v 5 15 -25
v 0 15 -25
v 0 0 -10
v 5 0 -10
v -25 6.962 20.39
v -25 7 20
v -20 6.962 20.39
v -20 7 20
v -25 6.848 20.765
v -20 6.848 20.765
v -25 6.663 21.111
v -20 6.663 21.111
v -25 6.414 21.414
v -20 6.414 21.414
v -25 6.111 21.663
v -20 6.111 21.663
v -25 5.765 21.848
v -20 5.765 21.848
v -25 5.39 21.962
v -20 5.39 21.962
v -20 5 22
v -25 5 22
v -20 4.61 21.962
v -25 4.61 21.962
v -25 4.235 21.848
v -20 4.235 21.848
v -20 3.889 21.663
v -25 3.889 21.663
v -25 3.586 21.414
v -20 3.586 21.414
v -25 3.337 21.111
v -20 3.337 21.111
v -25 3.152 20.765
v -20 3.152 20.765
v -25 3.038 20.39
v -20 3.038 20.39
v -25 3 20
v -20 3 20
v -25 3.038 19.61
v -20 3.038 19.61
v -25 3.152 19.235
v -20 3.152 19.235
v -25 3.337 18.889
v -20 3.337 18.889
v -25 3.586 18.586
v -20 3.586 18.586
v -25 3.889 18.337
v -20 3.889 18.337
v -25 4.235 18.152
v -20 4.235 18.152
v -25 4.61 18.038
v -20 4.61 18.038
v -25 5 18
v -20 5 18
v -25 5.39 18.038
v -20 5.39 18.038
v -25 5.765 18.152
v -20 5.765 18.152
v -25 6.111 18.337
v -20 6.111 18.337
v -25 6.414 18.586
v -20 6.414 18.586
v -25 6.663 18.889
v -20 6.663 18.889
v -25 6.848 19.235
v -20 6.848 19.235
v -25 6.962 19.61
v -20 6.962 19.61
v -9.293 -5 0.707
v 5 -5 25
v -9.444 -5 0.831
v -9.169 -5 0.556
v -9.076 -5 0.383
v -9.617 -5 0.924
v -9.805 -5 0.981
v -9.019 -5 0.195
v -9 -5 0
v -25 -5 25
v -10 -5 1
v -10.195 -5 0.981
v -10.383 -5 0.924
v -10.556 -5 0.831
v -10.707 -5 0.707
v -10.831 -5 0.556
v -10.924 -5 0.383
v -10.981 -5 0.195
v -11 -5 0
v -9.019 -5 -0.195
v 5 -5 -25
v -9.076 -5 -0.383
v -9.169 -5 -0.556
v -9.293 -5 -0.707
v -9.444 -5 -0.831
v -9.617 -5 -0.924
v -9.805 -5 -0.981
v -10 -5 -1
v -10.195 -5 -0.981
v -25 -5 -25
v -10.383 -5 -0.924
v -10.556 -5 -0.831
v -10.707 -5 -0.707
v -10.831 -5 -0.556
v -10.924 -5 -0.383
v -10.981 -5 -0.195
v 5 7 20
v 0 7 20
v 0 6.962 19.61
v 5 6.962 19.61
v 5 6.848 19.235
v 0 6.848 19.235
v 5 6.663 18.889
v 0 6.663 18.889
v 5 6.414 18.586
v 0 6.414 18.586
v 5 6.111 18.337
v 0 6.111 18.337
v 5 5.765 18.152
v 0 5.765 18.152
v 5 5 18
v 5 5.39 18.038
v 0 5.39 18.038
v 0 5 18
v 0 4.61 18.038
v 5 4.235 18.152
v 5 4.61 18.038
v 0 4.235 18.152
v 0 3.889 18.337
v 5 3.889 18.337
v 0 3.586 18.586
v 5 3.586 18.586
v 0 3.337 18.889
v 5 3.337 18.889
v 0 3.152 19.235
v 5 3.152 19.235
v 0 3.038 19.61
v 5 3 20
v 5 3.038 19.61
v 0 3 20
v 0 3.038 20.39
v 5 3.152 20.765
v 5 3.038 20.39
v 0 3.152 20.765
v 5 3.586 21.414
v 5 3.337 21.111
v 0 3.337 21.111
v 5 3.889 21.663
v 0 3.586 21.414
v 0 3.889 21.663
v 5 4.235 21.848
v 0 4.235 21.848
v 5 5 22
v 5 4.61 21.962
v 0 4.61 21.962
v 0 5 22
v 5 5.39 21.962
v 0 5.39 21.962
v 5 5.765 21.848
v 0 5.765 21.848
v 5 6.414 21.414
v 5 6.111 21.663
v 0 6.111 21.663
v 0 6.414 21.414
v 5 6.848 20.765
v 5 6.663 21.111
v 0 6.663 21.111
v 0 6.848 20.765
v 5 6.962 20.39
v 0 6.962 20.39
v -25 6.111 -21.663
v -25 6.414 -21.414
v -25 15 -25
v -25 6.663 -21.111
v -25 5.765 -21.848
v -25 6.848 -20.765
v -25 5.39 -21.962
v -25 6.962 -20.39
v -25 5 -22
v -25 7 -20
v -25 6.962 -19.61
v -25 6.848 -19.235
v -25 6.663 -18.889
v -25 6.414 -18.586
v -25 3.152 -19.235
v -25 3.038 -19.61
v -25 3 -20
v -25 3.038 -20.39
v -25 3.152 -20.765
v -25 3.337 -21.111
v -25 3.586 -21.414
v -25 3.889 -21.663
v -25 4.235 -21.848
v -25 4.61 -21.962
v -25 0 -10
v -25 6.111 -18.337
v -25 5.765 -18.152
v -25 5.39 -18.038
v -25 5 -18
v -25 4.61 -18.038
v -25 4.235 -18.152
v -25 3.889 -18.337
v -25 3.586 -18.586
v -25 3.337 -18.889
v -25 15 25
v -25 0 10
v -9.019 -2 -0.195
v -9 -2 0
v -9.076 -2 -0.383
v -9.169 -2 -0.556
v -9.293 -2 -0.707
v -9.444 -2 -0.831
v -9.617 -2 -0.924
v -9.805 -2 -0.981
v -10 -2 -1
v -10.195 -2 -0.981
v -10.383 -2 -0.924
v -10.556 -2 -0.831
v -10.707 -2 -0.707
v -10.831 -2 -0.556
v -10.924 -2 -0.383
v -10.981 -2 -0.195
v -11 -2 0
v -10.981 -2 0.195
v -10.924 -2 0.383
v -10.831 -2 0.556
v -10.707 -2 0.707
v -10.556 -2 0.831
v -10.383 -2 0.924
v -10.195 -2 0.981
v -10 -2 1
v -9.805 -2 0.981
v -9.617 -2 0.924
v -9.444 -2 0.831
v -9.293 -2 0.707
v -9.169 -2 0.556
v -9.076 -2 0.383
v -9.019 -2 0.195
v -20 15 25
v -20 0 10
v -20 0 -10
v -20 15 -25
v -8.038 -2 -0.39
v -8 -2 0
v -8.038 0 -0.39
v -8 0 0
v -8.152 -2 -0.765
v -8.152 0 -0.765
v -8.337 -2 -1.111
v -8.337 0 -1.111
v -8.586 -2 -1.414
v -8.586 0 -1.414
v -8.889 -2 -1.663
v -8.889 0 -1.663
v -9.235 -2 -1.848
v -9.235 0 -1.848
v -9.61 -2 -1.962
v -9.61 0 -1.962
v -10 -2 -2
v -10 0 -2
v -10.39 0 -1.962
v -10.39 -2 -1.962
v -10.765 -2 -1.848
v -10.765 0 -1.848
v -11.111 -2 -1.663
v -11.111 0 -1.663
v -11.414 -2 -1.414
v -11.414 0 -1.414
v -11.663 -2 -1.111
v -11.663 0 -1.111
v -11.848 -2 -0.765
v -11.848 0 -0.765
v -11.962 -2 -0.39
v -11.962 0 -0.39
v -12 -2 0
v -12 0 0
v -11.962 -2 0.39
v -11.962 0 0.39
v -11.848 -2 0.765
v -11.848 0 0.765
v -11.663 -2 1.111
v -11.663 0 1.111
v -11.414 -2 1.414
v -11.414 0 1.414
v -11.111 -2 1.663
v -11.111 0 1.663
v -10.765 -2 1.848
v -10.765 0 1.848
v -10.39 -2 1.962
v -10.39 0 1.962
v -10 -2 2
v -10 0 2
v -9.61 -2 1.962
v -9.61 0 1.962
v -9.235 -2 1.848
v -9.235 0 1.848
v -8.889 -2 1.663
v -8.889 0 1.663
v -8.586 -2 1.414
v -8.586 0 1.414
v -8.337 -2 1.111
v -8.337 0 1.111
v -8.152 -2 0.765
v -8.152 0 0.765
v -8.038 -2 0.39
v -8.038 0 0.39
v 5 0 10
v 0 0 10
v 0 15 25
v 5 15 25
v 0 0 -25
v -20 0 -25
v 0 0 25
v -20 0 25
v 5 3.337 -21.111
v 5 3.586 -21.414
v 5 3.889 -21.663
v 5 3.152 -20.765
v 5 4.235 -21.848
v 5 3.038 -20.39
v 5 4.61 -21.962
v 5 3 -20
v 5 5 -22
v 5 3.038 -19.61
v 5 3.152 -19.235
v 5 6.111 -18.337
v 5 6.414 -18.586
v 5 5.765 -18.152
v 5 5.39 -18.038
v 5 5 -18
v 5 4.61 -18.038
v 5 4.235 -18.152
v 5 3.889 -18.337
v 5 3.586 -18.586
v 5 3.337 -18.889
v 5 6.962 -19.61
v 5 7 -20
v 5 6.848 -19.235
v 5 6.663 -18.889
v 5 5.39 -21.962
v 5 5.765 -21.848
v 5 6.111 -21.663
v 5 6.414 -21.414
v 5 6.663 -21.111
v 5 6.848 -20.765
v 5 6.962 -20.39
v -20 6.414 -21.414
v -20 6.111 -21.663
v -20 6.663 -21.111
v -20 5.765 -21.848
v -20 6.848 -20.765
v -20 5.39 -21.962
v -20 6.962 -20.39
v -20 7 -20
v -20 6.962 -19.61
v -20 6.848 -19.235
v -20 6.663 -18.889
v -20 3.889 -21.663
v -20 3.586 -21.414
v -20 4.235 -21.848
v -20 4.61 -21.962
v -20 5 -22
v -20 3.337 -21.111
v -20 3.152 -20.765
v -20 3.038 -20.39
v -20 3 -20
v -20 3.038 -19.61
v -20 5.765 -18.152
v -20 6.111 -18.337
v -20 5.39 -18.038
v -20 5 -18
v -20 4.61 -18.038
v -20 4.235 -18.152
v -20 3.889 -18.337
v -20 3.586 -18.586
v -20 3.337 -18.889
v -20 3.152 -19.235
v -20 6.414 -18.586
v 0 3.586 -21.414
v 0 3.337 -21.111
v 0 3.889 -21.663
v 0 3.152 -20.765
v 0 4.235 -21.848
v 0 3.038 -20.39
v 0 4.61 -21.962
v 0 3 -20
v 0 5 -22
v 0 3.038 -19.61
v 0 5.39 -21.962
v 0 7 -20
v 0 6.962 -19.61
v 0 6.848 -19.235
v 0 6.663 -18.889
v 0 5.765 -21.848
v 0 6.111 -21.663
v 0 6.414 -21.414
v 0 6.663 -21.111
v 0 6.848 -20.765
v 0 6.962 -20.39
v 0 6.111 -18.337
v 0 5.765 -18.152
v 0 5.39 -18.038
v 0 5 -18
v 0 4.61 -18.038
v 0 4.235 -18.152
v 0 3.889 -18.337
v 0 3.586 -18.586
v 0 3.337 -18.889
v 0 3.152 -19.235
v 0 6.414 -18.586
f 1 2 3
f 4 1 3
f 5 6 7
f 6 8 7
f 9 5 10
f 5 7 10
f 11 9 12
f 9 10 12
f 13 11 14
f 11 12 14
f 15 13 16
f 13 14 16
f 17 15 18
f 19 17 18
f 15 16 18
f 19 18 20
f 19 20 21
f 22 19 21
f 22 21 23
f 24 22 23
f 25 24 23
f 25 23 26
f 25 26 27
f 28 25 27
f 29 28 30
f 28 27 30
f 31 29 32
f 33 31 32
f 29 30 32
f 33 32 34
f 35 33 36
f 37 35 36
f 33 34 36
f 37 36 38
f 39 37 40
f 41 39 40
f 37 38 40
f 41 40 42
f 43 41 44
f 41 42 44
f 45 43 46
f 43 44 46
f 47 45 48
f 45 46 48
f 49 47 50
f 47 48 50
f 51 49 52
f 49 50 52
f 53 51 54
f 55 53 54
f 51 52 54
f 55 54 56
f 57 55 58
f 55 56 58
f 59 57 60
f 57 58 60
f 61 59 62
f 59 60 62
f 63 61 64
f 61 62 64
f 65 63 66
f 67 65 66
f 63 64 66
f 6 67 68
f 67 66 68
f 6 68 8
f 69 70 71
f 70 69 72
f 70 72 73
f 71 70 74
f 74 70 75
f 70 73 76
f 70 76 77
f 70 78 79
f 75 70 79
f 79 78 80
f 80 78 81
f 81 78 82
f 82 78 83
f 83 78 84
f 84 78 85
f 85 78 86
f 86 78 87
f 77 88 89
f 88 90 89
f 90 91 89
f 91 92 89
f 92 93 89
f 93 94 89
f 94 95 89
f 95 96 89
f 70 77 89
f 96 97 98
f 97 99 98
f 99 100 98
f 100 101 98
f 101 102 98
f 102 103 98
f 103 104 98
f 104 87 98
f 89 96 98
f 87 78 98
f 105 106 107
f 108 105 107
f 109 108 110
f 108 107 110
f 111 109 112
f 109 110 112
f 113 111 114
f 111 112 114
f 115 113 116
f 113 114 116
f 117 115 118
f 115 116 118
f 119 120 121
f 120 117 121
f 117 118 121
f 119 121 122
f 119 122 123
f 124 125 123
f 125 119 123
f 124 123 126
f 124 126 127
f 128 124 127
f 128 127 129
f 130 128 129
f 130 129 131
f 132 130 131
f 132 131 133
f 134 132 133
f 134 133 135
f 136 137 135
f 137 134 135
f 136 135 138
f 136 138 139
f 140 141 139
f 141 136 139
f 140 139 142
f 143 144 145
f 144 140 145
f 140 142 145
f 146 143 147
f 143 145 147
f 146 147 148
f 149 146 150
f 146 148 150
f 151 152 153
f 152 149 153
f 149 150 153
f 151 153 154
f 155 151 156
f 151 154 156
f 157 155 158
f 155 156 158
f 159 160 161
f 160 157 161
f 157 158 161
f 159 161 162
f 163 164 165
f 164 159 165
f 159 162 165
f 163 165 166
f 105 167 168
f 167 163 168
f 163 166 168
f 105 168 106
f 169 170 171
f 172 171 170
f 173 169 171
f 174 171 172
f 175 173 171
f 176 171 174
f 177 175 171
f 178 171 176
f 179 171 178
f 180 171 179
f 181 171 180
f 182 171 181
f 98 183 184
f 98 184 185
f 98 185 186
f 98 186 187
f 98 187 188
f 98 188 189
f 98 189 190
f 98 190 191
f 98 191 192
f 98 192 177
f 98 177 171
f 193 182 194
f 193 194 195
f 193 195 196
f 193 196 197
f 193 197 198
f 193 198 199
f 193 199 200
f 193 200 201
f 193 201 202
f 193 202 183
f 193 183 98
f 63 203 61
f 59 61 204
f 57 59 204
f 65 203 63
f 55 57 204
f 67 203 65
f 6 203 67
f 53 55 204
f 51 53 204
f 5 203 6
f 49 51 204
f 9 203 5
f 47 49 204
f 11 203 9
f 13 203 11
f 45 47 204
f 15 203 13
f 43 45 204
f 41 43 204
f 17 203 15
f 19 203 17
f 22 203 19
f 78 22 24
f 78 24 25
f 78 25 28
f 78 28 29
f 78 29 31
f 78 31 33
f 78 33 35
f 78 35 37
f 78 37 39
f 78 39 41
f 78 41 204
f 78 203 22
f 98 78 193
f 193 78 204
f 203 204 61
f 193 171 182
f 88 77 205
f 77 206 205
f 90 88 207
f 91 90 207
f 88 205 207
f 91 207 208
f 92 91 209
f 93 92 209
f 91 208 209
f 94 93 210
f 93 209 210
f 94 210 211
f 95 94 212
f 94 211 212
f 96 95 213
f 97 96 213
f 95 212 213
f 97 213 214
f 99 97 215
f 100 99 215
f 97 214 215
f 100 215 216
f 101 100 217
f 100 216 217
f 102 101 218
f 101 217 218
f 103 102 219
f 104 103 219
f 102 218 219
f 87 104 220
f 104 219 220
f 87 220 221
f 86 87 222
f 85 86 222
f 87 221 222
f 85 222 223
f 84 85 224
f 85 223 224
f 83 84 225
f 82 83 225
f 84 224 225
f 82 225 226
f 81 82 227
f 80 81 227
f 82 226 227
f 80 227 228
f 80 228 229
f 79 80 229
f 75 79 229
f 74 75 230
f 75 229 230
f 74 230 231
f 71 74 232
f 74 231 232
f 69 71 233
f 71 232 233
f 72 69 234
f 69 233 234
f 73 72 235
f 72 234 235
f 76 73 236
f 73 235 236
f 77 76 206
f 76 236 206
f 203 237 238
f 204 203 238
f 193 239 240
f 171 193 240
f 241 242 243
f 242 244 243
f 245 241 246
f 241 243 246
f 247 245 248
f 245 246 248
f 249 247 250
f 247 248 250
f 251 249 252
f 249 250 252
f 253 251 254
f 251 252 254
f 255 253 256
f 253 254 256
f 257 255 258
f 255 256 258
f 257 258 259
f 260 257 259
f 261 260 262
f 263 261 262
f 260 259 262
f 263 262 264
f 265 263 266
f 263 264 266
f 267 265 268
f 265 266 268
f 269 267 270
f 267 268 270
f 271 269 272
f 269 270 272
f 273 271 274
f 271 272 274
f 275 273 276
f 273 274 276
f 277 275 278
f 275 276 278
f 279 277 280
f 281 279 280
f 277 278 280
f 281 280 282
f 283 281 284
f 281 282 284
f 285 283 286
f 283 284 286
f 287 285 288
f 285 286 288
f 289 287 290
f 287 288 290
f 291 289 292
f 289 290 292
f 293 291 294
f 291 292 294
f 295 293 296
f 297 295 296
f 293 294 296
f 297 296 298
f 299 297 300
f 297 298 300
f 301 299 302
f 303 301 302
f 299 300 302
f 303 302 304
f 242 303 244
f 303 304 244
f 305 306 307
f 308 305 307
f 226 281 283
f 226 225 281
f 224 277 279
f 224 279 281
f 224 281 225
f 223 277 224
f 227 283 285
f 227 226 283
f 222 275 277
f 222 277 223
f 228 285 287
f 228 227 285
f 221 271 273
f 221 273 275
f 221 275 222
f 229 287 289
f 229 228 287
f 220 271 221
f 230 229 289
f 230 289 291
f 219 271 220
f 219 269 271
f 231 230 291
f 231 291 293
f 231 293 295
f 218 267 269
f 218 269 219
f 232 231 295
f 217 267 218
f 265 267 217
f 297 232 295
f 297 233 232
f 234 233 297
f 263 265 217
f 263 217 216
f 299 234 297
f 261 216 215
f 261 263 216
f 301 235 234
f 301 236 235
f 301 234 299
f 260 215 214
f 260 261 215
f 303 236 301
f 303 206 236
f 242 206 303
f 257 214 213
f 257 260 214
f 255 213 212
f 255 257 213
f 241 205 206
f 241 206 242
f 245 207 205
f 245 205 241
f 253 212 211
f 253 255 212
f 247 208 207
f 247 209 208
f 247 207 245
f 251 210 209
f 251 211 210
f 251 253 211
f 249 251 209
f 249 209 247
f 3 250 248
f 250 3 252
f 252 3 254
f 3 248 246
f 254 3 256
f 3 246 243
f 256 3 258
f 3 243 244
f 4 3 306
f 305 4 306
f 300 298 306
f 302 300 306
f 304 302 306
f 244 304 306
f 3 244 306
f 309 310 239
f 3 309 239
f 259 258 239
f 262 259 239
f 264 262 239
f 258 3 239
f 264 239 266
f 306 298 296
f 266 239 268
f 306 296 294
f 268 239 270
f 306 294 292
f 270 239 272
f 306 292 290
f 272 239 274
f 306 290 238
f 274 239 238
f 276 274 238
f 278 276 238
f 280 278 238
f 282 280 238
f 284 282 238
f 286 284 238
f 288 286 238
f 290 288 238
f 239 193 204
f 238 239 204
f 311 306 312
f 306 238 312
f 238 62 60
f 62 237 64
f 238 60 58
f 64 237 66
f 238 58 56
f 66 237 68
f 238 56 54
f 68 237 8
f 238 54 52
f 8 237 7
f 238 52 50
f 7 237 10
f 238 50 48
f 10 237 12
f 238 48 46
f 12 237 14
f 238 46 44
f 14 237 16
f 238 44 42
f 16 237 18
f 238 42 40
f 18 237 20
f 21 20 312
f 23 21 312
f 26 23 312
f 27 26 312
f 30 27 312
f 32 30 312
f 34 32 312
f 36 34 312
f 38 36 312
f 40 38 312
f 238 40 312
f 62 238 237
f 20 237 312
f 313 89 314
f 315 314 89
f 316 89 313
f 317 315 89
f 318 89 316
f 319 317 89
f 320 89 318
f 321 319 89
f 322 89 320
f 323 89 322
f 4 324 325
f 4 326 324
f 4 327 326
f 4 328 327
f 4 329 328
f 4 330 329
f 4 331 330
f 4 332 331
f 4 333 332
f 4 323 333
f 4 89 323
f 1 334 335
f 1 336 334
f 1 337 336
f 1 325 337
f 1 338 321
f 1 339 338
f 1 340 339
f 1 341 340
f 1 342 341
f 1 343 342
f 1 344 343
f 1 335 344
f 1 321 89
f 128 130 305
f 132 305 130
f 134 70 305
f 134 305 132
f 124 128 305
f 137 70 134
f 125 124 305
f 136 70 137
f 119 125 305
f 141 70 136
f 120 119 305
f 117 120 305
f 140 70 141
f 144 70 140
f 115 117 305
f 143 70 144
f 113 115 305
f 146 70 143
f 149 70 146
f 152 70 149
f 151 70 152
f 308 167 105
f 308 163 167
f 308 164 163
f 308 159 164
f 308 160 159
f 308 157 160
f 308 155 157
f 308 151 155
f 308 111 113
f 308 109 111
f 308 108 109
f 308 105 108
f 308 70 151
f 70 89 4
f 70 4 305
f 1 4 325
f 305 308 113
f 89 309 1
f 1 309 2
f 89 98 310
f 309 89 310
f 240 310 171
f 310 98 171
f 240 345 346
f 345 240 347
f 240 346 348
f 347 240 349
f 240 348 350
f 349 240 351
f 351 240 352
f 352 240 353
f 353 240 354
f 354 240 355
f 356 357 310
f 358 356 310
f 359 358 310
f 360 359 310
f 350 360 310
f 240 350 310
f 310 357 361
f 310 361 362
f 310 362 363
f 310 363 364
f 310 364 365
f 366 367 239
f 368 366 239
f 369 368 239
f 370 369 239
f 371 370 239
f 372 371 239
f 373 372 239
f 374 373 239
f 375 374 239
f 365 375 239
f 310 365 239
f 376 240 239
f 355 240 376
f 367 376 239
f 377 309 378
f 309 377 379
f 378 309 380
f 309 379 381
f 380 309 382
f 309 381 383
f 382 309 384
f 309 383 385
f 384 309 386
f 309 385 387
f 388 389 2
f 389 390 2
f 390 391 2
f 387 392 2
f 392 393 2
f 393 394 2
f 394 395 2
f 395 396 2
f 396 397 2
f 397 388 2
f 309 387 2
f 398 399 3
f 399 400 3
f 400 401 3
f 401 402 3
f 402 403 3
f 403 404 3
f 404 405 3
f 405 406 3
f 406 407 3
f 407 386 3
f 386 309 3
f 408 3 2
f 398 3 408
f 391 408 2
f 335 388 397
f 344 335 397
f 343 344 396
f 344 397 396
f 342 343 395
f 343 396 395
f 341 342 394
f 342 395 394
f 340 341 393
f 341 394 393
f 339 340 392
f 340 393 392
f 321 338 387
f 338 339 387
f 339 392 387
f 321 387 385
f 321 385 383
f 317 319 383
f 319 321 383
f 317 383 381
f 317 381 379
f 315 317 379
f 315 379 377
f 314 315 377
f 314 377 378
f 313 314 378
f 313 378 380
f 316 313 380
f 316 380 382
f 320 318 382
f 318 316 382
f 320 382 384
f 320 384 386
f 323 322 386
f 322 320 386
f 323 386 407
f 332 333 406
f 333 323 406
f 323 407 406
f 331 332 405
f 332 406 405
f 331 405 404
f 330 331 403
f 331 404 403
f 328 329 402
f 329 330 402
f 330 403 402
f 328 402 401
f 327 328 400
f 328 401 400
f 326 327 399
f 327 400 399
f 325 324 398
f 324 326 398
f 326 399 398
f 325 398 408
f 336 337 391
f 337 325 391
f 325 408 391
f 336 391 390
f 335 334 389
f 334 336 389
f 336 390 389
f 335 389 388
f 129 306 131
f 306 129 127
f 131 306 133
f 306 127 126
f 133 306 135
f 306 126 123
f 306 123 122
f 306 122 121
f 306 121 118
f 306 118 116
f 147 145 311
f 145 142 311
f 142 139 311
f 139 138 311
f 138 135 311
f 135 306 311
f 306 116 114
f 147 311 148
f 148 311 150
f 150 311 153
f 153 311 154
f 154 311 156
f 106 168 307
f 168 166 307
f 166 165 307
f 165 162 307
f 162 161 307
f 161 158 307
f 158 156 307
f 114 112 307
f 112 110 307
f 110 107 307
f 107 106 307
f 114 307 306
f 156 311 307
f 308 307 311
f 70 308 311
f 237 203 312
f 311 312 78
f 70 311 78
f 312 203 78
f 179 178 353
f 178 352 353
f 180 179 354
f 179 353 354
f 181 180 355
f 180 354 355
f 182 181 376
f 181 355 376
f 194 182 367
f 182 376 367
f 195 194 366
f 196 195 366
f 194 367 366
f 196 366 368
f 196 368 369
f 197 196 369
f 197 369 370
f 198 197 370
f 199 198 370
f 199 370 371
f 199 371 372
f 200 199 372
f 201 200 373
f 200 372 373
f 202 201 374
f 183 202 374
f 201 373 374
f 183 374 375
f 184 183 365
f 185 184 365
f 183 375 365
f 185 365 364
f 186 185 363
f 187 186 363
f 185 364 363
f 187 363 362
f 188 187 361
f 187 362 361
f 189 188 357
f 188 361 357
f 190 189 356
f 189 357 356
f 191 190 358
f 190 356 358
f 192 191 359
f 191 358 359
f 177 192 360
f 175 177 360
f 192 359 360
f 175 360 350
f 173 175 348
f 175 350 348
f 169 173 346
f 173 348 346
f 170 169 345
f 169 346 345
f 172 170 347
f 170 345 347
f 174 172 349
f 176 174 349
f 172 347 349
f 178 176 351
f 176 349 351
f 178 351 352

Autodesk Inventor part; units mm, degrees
ref_plane "YZ Plane" through (0, 0, 0) normal (1, 0, 0) x (0, 1, 0)
ref_plane "XZ Plane" through (0, 0, 0) normal (0, 1, 0) x (-1, 0, 0)
ref_plane "XY Plane" through (0, 0, 0) normal (0, 0, 1) x (1, 0, 0)
sketch "Sketch1" plane through (0, 0, 0) normal (1, 0, 0) x (0, 1, 0)
  line L0 (15, 25) -> (-5, 25)
  line L1 (-5, 25) -> (-5, -25)
  line L2 (-5, -25) -> (15, -25)
  line L3 (15, -25) -> (0, -10)
  line L4 (0, -10) -> (0, 10)
  line L5 (0, 10) -> (15, 25)
  line L6 (0, 0) -> (-5, 0) construction
  circle A0 centre (5, -20) radius 2
  circle A1 centre (5, 20) radius 2
  dimension "d0" = 50
  dimension "d1" = 45
  dimension "d2" = 5
  dimension "d4" = 40
  dimension "d5" = 4
  dimension "d6" = 20
  dimension "d7" = 5
  dimension "d8" = 15
extrude "Extrusion1" add sketch "Sketch1" along normal blind 5
sketch "Sketch2" plane through (0, 0, 0) normal (-1, 0, 0) x (0, 0, 1)
  line L0 (25, -5) -> (-25, -5) projected
  line L1 (-25, -5) -> (25, -5)
  line L2 (25, -5) -> (25, 0)
  line L3 (25, 0) -> (-25, 0)
  line L4 (-25, 0) -> (-25, -5)
  point P0 (0, 0)
extrude "Extrusion2" add sketch "Sketch2" along normal blind 10
mirror "Mirror1" about plane through (-10, -2.5, 0) normal (-1, 0, 0)
sketch "Sketch3" plane through (0, 0, 10) normal (0, 1, 0) x (1, 0, 0)
  line L0 (-20, 0) -> (-20, -15) construction
  line L1 (0, 20) -> (5, 20) construction
  line L2 (-20, 0) -> (0, 20) construction
  line L3 (-20, 35) -> (-20, 20) construction
  line L4 (0, 0) -> (5, 0) construction
  line L5 (-20, 20) -> (0, 0) construction
  circle A0 centre (-10, 10) radius 2
  point P0 (0, 10)
  dimension "d13" = 4
extrude "Extrusion3" cut sketch "Sketch3" against normal blind 2
sketch "Sketch4" plane through (0, 0, 10) normal (0, 1, 0) x (1, 0, 0)
  circle A0 centre (-10, 10) radius 2 projected
  circle A1 centre (-10, 10) radius 1
  point P0 (0, 10)
  dimension "d16" = 2
extrude "Extrusion4" cut sketch "Sketch4" against normal through all contours A1
equation "\"d6\" = 0.5 * d4"
equation "\"d7\" = 0.333333 * d8"
properties part number "lower fan mount"
